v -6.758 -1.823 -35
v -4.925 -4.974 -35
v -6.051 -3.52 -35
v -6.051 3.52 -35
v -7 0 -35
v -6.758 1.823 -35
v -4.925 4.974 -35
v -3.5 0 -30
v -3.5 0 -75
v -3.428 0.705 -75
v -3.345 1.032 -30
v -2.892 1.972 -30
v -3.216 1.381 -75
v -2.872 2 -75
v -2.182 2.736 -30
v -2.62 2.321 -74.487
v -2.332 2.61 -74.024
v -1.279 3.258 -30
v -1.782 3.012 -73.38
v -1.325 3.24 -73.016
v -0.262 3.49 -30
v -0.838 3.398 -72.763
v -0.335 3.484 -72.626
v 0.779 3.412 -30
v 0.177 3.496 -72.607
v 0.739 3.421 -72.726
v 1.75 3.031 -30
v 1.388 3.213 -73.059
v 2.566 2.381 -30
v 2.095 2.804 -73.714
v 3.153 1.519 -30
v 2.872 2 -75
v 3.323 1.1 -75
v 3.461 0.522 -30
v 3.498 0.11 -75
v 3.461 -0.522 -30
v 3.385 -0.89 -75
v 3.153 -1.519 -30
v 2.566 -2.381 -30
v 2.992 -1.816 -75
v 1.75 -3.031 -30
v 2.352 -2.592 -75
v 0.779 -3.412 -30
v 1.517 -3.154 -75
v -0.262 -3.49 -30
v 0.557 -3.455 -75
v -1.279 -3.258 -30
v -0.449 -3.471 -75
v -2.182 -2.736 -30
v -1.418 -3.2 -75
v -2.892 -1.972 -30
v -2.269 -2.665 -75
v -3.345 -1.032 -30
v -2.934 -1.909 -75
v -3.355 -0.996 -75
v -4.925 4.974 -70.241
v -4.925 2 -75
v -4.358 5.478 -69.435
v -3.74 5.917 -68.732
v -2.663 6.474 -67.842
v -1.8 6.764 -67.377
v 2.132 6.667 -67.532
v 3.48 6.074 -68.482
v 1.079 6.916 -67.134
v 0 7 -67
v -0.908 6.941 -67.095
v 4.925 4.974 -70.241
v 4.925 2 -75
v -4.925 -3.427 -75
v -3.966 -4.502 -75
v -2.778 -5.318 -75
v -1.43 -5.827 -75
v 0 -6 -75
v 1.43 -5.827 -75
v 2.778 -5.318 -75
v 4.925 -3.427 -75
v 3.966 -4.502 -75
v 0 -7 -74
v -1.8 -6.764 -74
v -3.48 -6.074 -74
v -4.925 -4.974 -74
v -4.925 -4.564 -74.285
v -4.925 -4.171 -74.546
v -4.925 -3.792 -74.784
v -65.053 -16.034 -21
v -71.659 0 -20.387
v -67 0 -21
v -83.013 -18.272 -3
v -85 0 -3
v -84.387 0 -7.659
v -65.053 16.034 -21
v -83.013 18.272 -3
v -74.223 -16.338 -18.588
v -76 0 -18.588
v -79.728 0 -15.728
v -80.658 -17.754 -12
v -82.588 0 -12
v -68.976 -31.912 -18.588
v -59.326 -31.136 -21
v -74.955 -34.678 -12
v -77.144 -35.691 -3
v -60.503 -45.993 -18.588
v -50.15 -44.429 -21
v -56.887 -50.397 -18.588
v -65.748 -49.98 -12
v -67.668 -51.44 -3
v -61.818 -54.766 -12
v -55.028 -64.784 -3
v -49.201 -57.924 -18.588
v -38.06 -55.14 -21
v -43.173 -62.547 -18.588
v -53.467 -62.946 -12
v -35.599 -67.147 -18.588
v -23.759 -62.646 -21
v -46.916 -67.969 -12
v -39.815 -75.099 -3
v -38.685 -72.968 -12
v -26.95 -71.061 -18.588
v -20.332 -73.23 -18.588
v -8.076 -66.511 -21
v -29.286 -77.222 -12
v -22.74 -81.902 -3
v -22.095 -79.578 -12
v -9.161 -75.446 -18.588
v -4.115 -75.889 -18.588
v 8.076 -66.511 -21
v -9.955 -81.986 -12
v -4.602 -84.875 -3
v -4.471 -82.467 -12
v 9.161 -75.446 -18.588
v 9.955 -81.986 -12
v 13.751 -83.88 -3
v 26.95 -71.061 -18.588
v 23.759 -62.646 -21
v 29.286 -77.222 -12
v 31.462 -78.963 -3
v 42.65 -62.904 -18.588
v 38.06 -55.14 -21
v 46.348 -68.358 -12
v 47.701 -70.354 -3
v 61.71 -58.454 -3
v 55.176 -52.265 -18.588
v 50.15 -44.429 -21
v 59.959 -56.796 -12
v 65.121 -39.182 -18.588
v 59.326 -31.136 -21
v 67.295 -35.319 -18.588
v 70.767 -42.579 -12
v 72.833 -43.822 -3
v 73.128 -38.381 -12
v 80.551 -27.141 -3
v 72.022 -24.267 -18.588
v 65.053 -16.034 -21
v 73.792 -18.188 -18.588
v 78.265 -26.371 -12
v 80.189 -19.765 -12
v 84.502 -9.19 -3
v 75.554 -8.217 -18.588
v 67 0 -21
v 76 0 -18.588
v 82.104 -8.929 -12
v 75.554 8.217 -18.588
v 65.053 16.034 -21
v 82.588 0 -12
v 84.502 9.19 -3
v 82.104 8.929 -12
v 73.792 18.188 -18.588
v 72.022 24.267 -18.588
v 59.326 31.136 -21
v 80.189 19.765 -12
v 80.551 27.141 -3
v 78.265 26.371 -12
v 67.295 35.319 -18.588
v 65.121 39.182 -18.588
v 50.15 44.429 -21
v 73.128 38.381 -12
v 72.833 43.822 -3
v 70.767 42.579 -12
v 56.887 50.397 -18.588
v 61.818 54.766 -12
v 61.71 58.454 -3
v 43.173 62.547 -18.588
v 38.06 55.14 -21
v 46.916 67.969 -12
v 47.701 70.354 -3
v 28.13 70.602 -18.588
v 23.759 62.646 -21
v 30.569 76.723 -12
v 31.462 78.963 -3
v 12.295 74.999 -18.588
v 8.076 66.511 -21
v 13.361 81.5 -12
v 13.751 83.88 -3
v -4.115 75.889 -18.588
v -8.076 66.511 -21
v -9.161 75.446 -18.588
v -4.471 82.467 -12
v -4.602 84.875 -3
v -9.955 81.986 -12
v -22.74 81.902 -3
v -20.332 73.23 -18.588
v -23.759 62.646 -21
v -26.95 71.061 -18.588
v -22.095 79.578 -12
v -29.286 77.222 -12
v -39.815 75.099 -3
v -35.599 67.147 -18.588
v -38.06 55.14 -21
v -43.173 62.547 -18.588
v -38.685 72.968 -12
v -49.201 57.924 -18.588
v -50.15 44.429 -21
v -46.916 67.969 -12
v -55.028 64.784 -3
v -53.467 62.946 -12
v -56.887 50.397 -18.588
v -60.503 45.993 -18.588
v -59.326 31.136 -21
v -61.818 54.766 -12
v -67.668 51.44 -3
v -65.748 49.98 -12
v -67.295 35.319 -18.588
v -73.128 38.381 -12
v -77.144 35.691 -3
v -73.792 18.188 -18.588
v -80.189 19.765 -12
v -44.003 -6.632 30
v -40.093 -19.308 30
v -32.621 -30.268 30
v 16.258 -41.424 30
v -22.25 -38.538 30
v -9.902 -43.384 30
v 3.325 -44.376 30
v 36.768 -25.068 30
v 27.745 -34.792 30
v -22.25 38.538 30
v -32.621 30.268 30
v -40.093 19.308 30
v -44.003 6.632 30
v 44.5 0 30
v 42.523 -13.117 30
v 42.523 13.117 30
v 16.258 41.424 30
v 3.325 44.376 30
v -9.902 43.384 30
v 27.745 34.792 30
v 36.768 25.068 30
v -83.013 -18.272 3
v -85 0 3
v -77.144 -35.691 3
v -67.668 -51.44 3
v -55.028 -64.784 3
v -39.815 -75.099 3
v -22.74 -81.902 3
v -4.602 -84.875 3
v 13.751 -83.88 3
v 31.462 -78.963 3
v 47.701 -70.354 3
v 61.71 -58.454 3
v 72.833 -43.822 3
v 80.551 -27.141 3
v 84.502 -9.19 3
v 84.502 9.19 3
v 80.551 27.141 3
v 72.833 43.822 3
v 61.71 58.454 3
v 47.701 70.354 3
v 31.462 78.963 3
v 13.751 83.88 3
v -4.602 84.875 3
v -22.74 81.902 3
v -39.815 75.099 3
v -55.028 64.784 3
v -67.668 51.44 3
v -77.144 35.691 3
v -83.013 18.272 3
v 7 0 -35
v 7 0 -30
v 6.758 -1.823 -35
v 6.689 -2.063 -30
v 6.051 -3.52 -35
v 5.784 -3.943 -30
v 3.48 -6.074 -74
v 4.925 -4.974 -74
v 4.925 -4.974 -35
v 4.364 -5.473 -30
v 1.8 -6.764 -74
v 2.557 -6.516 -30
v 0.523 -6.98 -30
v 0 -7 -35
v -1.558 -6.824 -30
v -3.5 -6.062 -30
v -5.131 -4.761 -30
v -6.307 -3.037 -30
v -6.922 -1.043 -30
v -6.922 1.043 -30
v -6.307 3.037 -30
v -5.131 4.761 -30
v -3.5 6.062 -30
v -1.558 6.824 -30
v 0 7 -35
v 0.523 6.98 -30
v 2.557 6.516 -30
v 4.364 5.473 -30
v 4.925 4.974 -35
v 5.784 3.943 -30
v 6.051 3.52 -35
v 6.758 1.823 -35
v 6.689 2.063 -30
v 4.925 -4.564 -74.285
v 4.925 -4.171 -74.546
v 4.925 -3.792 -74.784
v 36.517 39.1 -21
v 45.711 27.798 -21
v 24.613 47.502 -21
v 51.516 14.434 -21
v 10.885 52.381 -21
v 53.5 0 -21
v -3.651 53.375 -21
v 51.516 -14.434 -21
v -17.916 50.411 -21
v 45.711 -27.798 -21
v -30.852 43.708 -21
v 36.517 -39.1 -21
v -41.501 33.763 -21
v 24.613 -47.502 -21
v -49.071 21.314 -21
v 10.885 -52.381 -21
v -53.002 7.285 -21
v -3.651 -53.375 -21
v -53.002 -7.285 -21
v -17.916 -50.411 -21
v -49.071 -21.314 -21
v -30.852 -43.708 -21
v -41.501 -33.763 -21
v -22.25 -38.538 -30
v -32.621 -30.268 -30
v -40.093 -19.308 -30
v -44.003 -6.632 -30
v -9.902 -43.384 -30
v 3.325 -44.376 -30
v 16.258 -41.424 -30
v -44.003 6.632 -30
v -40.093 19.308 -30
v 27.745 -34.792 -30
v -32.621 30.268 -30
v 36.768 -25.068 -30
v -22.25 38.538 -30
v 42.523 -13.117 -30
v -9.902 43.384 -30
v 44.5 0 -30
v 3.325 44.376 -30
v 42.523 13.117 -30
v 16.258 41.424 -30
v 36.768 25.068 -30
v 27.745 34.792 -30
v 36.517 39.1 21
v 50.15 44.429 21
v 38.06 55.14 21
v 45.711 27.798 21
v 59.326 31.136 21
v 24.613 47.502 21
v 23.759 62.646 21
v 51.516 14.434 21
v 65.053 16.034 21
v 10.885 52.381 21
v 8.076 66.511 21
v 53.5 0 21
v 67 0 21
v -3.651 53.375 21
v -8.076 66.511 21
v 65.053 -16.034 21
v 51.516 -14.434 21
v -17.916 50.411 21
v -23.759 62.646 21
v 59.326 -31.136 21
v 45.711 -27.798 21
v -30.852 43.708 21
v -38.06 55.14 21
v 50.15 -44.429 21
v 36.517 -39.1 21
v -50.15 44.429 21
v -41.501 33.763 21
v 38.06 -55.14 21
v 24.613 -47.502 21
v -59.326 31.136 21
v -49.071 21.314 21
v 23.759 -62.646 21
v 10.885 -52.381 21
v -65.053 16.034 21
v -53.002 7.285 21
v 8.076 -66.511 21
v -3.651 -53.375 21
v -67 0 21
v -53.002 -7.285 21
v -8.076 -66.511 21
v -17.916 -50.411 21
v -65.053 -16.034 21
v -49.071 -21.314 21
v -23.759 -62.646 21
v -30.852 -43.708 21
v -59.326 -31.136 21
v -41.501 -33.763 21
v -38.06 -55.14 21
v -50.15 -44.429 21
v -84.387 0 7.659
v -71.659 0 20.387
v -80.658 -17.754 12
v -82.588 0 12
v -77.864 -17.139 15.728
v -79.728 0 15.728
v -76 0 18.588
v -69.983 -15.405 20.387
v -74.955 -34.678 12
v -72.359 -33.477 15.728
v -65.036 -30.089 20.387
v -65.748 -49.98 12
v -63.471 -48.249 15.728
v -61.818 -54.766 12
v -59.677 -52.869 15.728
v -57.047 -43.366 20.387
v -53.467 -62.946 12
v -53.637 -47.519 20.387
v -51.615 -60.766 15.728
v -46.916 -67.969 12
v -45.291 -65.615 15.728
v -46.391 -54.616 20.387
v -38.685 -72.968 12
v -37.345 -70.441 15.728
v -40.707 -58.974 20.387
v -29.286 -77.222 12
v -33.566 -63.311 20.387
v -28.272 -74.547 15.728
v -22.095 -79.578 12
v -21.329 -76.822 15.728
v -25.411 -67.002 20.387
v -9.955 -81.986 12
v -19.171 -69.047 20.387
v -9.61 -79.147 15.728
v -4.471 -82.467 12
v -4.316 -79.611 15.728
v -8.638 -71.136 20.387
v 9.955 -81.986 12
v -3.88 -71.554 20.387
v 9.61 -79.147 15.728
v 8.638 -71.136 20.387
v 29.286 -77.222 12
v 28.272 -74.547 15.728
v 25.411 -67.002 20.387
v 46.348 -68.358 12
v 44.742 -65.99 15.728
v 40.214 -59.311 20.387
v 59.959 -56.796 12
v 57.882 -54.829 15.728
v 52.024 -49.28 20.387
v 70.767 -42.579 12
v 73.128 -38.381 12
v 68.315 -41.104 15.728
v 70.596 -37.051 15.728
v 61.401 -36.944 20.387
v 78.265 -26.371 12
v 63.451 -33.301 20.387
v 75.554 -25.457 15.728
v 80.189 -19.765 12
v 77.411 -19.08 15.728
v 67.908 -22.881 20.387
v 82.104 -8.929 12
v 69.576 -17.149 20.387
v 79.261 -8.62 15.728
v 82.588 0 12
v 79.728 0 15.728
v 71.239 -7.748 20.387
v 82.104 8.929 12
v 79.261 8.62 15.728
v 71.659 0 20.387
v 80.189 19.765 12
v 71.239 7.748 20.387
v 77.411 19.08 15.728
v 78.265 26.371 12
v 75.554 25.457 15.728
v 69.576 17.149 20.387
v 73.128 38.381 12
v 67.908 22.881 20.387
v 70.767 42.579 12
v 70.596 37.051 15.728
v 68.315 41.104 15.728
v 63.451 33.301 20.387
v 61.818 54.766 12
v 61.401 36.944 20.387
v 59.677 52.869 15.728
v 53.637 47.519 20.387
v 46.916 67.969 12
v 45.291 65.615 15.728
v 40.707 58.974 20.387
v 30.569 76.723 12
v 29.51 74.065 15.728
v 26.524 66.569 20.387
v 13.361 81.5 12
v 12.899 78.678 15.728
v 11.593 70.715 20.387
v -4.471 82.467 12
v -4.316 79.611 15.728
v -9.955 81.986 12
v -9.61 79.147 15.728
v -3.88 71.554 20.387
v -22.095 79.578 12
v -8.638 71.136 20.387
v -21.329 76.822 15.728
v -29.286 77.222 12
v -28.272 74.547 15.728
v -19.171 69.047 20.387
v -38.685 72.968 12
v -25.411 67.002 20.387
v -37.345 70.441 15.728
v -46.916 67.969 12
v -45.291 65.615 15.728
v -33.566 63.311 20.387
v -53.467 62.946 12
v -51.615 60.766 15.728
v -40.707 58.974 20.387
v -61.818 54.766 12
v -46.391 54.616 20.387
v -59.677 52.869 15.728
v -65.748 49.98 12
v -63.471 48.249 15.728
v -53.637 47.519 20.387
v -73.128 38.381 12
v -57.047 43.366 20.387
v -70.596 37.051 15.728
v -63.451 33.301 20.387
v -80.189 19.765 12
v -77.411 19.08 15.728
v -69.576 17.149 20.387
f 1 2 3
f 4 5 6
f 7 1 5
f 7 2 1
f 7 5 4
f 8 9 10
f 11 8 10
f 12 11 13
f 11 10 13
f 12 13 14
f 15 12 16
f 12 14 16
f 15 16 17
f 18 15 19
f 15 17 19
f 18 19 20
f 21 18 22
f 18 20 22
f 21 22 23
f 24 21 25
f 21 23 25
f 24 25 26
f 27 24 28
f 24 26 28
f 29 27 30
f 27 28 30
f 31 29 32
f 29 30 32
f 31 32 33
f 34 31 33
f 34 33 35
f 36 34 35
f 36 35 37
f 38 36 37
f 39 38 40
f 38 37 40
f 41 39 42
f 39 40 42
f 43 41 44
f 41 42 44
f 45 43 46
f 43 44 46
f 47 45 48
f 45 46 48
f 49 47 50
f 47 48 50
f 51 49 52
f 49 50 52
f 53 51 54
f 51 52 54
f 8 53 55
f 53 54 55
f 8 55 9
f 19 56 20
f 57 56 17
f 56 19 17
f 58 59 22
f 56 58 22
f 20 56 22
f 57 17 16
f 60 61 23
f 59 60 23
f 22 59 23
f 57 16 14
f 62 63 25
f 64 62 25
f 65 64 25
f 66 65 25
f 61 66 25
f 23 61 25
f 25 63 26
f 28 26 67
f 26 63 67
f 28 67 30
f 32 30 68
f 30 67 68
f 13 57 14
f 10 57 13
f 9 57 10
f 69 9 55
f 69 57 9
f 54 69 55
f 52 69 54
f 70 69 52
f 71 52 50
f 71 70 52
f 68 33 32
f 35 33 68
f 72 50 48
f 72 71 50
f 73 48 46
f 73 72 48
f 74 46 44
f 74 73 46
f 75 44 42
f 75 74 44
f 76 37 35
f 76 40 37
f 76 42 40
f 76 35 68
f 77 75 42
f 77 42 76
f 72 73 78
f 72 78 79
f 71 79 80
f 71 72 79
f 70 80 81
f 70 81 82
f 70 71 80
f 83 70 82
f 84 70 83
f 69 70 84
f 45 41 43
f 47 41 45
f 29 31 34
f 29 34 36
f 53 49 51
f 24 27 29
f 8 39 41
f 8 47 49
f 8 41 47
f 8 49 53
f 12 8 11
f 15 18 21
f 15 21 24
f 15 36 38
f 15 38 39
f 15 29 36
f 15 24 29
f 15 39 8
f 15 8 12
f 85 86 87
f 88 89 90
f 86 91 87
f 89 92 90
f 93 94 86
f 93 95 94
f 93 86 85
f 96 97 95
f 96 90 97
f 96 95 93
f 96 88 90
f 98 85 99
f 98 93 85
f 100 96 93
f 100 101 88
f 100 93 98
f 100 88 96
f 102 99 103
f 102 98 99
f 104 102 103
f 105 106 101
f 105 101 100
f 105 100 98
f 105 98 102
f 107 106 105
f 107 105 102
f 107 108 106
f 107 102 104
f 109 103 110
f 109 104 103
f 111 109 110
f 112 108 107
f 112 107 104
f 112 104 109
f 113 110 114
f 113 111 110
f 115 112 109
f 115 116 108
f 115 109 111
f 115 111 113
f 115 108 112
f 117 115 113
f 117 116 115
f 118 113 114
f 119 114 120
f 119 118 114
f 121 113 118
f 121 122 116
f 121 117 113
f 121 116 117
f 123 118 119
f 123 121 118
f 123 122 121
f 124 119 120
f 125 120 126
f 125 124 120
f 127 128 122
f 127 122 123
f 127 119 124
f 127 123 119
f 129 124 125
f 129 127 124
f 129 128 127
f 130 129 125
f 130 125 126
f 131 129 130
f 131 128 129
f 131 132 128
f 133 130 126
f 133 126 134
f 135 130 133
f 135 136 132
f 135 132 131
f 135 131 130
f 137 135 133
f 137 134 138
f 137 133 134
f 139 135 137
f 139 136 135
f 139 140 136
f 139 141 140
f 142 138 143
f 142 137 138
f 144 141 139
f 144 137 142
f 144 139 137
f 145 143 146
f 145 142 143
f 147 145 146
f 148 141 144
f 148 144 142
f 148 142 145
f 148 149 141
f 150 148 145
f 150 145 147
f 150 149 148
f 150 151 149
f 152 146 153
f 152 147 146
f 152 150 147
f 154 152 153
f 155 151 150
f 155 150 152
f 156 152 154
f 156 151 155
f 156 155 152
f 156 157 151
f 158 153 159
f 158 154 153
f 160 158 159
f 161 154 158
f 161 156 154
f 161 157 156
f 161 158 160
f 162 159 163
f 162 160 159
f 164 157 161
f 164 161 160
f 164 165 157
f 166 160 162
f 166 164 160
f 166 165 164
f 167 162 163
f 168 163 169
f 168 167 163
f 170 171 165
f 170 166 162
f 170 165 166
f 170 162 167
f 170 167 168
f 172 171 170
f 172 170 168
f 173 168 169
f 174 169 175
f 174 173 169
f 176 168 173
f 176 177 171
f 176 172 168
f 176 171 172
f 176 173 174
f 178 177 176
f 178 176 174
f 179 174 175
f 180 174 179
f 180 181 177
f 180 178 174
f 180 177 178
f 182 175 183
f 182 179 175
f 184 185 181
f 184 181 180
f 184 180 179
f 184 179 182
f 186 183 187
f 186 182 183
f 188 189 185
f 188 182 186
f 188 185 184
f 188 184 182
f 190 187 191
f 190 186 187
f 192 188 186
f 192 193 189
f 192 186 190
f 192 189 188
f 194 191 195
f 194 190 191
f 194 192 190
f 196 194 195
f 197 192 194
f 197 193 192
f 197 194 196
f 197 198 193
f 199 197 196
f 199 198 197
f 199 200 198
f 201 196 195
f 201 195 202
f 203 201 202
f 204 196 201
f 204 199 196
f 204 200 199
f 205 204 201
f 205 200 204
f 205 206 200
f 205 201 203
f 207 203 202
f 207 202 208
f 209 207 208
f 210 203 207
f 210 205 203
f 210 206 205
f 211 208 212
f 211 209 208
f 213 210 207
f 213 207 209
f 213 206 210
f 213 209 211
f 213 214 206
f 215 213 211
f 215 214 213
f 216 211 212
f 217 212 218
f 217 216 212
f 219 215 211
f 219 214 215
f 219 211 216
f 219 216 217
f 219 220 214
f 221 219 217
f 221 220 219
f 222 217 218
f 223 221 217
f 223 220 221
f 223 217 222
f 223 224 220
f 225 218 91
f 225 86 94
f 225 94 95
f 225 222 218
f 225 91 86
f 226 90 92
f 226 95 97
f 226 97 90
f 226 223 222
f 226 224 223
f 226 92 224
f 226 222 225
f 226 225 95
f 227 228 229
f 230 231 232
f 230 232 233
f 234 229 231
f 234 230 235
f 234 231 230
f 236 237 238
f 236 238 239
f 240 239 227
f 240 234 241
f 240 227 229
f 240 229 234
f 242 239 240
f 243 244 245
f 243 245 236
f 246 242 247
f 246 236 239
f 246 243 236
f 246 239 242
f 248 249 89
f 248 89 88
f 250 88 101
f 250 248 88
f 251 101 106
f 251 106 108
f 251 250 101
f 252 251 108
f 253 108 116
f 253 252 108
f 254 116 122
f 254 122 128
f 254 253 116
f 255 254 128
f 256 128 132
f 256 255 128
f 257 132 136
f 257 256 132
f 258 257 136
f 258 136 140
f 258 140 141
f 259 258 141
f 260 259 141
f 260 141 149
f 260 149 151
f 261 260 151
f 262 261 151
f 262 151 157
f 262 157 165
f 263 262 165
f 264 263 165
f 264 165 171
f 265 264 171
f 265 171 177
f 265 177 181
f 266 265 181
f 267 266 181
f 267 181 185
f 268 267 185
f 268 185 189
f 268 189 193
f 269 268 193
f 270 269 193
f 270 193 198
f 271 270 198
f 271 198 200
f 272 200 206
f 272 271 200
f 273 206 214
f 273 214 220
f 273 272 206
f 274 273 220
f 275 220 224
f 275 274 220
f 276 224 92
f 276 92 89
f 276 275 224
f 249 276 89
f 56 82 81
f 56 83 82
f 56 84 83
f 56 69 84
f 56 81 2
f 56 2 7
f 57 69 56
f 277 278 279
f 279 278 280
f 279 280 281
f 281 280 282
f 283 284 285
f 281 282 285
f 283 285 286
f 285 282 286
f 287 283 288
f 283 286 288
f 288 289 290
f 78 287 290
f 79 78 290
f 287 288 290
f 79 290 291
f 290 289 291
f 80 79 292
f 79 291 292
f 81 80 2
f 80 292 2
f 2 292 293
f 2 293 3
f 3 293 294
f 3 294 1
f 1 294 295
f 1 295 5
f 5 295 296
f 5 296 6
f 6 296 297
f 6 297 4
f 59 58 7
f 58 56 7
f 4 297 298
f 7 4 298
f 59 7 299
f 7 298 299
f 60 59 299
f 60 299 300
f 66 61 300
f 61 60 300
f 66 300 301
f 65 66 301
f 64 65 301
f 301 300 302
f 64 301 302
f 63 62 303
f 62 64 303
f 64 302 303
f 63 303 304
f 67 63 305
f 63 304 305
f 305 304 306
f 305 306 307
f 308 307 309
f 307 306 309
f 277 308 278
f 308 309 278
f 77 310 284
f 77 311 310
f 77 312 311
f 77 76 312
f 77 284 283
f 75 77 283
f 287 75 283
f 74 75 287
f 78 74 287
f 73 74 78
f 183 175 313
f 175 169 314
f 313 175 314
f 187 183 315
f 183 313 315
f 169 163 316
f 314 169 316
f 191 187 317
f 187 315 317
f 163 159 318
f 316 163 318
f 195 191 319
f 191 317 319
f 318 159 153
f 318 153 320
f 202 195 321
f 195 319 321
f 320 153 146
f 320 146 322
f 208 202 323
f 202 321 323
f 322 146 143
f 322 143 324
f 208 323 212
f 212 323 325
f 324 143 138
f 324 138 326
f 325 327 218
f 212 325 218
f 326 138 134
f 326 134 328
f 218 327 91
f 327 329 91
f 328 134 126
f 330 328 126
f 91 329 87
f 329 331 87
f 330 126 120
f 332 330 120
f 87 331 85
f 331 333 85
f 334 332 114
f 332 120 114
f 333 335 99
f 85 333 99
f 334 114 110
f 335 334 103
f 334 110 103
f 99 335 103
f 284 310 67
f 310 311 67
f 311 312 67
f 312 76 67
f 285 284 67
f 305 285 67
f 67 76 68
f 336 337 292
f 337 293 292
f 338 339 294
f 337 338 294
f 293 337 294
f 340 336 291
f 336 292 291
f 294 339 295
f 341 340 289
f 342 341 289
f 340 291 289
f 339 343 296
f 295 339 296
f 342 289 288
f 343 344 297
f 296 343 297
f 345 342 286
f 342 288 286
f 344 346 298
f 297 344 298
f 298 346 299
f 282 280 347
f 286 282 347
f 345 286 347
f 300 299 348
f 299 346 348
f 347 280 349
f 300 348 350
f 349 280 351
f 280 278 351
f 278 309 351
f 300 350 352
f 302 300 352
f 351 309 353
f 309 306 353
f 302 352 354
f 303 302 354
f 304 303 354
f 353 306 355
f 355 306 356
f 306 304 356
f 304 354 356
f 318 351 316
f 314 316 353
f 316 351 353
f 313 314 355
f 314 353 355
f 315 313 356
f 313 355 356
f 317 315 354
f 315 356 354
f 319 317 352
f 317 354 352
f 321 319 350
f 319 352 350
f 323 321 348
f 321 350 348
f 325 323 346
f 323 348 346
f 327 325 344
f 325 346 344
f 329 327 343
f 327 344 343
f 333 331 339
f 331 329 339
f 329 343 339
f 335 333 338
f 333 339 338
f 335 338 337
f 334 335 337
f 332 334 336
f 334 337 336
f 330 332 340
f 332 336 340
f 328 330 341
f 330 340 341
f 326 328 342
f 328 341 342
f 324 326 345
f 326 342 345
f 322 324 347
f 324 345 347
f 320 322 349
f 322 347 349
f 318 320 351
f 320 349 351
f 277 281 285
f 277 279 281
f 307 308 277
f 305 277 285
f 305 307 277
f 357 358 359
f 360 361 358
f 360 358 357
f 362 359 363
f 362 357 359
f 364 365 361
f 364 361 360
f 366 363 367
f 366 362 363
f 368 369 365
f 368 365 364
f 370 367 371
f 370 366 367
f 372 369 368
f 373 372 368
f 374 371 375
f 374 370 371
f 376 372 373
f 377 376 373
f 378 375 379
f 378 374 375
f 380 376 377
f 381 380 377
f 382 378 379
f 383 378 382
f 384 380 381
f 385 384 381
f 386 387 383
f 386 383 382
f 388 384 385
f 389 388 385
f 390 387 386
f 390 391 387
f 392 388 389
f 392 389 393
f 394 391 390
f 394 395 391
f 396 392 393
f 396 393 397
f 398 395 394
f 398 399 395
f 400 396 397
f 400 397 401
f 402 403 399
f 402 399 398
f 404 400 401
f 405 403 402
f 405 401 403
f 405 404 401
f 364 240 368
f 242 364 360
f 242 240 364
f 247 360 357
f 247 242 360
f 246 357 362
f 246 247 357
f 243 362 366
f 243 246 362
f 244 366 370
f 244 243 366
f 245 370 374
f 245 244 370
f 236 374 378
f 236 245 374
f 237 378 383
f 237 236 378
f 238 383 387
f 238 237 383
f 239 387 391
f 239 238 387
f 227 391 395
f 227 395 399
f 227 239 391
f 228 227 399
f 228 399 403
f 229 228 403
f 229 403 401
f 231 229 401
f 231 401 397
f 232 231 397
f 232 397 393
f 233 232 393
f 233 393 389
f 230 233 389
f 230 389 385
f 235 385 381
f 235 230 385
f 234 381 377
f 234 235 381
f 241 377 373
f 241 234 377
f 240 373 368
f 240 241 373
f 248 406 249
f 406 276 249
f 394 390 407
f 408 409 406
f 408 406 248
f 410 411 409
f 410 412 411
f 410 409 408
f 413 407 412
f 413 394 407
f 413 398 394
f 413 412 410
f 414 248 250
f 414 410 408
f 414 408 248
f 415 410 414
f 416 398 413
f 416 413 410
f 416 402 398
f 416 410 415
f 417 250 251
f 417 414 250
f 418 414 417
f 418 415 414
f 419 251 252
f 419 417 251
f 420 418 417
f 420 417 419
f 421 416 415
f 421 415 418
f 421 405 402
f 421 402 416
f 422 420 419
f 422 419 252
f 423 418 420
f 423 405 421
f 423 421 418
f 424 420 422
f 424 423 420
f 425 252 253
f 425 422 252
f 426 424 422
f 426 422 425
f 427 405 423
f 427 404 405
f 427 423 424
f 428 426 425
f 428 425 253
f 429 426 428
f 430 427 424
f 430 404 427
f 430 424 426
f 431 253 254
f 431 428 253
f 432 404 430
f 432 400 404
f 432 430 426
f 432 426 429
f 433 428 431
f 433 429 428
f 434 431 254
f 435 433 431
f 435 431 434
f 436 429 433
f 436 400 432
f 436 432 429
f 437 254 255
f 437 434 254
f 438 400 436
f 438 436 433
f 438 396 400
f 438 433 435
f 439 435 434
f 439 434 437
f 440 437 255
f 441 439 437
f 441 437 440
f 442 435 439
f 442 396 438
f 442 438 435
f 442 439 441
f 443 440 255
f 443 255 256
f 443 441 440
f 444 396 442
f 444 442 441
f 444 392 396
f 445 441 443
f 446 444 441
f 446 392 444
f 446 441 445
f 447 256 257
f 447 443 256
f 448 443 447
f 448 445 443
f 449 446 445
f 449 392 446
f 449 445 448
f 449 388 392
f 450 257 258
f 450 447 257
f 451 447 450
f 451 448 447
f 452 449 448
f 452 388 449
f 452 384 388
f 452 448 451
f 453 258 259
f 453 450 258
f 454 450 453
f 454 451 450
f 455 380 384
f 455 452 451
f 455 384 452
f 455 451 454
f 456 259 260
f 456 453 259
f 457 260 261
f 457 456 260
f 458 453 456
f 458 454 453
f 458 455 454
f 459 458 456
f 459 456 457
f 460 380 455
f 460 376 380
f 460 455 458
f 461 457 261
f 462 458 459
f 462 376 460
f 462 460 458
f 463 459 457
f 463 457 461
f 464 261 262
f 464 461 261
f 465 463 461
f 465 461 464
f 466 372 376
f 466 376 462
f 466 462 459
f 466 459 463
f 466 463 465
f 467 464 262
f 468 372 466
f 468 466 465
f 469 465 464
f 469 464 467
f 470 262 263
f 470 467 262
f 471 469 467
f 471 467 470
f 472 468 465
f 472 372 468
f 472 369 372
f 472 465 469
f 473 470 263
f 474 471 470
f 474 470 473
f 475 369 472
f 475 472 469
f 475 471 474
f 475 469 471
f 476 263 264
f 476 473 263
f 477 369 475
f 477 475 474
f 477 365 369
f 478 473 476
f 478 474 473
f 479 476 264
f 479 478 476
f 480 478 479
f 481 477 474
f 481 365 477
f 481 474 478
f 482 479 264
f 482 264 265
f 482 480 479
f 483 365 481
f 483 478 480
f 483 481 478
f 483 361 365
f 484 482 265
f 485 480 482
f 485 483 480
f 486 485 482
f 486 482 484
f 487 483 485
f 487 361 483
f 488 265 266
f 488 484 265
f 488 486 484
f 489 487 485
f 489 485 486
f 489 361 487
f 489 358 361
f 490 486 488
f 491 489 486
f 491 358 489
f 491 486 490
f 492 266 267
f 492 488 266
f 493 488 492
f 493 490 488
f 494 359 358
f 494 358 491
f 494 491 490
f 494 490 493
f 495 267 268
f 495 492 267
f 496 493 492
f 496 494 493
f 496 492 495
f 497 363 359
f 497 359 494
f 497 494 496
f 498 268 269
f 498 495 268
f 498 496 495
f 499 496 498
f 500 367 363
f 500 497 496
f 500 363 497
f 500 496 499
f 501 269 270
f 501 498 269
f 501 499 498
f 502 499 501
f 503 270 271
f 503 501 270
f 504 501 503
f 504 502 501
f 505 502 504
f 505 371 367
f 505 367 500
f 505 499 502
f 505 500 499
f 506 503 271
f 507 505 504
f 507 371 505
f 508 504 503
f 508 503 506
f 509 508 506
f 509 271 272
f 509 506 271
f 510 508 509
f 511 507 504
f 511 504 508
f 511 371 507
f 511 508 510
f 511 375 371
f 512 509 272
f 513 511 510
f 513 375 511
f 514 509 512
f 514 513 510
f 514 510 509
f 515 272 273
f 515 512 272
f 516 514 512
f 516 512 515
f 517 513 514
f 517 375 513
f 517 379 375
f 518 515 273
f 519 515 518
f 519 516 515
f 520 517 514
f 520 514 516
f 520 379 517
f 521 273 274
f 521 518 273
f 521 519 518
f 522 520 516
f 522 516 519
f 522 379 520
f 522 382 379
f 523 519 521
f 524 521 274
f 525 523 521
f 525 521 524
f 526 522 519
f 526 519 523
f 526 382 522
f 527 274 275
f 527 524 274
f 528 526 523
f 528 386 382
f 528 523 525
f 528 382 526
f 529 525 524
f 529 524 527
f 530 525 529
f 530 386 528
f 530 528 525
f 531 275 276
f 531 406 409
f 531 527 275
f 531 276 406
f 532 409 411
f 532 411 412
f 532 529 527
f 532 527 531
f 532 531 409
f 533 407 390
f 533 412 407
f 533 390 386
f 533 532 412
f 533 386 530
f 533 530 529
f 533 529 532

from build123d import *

# Parameters (mm, degrees)
SKETCH_1_R           = 85
EXTRUDE_1_DEPTH      = 21
SKETCH_2_R           = 54.5
EXTRUDE_2_DEPTH      = 30
CHAMFER_1_SIZE       = 10
SKETCH_3_R           = 7
EXTRUDE_3_DEPTH      = 45
SKETCH_5_OUTSIDE_W   = 224.47
SKETCH_5_OUTSIDE_H   = 224.47
SKETCH_5_OUTSIDE_W_2 = 9.85
SKETCH_5_OUTSIDE_H_2 = 14
CUT_EXTRUDE_1_DEPTH  = 40
CHAMFER_3_SIZE       = 1
SKETCH_7_R           = 3.5
CUT_EXTRUDE_2_DEPTH  = 45
FILLET_1_R           = 18
CUT_EXTRUDE_3_REACH  = 146.695


with BuildPart() as part:
    # 草图1 → 凸台-拉伸1 (new, symmetric)
    with BuildSketch(Plane.XY):
        with Locations(Location((0, 0, 0), (0, 0, 180))):
            Circle(SKETCH_1_R)
    extrude(amount=EXTRUDE_1_DEPTH, both=True)

    # 草图2 → 凸台-拉伸2 (add, symmetric)
    with BuildSketch(Plane.XY):
        Circle(SKETCH_2_R)
    extrude(amount=EXTRUDE_2_DEPTH, both=True)

    # 倒角1
    # the kernel refuses this chamfer: 10 mm, written as the material it takes off along each edge
    with BuildSketch(Plane(origin=(0, 0, -30), x_dir=(1, 0, 0), z_dir=(0, -1, 0))) as chamfer_1_piece_1_section:
        Polygon((54.5, CHAMFER_1_SIZE), (54.5 - CHAMFER_1_SIZE, 0), (54.5, 0), align=None)
    chamfer_1_piece_1 = revolve(axis=Axis((0, 0, -30), (0, 0, 1)), mode=Mode.PRIVATE)
    chamfer_1_piece_1 = split(chamfer_1_piece_1, bisect_by=Plane(origin=(-49.041649133, 0, -21), z_dir=(0, 0, -1)), keep=Keep.TOP, mode=Mode.PRIVATE)
    add(chamfer_1_piece_1, mode=Mode.SUBTRACT)
    with BuildSketch(Plane(origin=(0, 0, 30), x_dir=(1, 0, 0), z_dir=(0, -1, 0))) as chamfer_1_piece_2_section:
        Polygon((54.5, -CHAMFER_1_SIZE), (54.5 - CHAMFER_1_SIZE, 0), (54.5, 0), align=None)
    chamfer_1_piece_2 = revolve(axis=Axis((0, 0, 30), (0, 0, 1)), mode=Mode.PRIVATE)
    chamfer_1_piece_2 = split(chamfer_1_piece_2, bisect_by=Plane(origin=(-49.041649133, 0, 21), z_dir=(0, 0, 1)), keep=Keep.TOP, mode=Mode.PRIVATE)
    add(chamfer_1_piece_2, mode=Mode.SUBTRACT)

    # 草图3 → 凸台-拉伸3 (add)
    with BuildSketch(Plane(origin=(0, 0, -30), x_dir=(-1, 0, 0), z_dir=(0, 0, -1))):
        with Locations(Location((0, 0, 0), (0, 0, 180))):
            Circle(SKETCH_3_R)
    extrude(amount=EXTRUDE_3_DEPTH)

    # 草图5 outside → 切除-拉伸1 (cut)
    with BuildSketch(Plane(origin=(0, 0, -75), x_dir=(-1, 0, 0), z_dir=(0, 0, -1))):
        Rectangle(SKETCH_5_OUTSIDE_W, SKETCH_5_OUTSIDE_H)
        Rectangle(SKETCH_5_OUTSIDE_W_2, SKETCH_5_OUTSIDE_H_2, mode=Mode.SUBTRACT)
    extrude(amount=-CUT_EXTRUDE_1_DEPTH, mode=Mode.SUBTRACT)

    # 倒角3
    # the kernel refuses this chamfer: 1 mm, written as the material it takes off along each edge
    with BuildSketch(Plane(origin=(0, 0, -75), x_dir=(-0.9118755958915212, 0.4104666827130834, 0), z_dir=(-0.4104666827130834, -0.9118755958915212, 0))) as chamfer_3_piece_1:
        Polygon((7, -CHAMFER_3_SIZE), (7 - CHAMFER_3_SIZE, 0), (7, 0), align=None)
    revolve(axis=Axis((0, 0, -75), (0, 0, -1)), revolution_arc=65.76584555, mode=Mode.SUBTRACT)
    with BuildSketch(Plane(origin=(0, 0, -75), x_dir=(0.9118755958915, -0.41046668271313064, 0), z_dir=(0.41046668271313064, 0.9118755958915, 0))) as chamfer_3_piece_2:
        Polygon((7, -CHAMFER_3_SIZE), (7 - CHAMFER_3_SIZE, 0), (7, 0), align=None)
    revolve(axis=Axis((0, 0, -75), (0, 0, -1)), revolution_arc=65.76584555, mode=Mode.SUBTRACT)
    with BuildSketch(Plane(origin=(0, 0, -75), x_dir=(0, -1, 0), z_dir=(1, 0, 0))) as chamfer_3_piece_3:
        Polygon((7, -CHAMFER_3_SIZE), (7 - CHAMFER_3_SIZE, 0), (7, 0), align=None)
    revolve(axis=Axis((0, 0, -75), (0, 0, -1)), revolution_arc=65.76584555, mode=Mode.SUBTRACT)
    with BuildSketch(Plane(origin=(0, 0, -75), x_dir=(0, 1, 0), z_dir=(-1, 0, 0))) as chamfer_3_piece_4:
        Polygon((7, -CHAMFER_3_SIZE), (7 - CHAMFER_3_SIZE, 0), (7, 0), align=None)
    revolve(axis=Axis((0, 0, -75), (0, 0, -1)), revolution_arc=65.76584555, mode=Mode.SUBTRACT)

    # 草图7 → 切除-拉伸2 (cut)
    with BuildSketch(Plane(origin=(0, 0, -75), x_dir=(-1, 0, 0), z_dir=(0, 0, -1))):
        Circle(SKETCH_7_R)
    extrude(amount=-CUT_EXTRUDE_2_DEPTH, mode=Mode.SUBTRACT)

    # 圆角1
    fillet_1_edges = [part.edges().sort_by_distance(p)[0] for p in [
        (85, 0, -21),
        (85, 0, 21),
    ]]
    fillet(fillet_1_edges, radius=FILLET_1_R)

    # 草图8 → 切除-拉伸3 (cut, up to next)
    with BuildSketch(Plane(origin=(4.925, 0, 0), x_dir=(0, 0, -1), z_dir=(1, 0, 0)), mode=Mode.PRIVATE) as cut_extrude_3_sk1:
        Polygon((75, 2), (75, 7), (67, 7), align=None)
    cut_extrude_3_tool1 = extrude(cut_extrude_3_sk1.sketch, amount=-CUT_EXTRUDE_3_REACH, mode=Mode.PRIVATE) & part.part
    add(cut_extrude_3_tool1.solids().sort_by_distance((4.925, 5.333333, -72.333333))[0], mode=Mode.SUBTRACT)


solid = part.part
